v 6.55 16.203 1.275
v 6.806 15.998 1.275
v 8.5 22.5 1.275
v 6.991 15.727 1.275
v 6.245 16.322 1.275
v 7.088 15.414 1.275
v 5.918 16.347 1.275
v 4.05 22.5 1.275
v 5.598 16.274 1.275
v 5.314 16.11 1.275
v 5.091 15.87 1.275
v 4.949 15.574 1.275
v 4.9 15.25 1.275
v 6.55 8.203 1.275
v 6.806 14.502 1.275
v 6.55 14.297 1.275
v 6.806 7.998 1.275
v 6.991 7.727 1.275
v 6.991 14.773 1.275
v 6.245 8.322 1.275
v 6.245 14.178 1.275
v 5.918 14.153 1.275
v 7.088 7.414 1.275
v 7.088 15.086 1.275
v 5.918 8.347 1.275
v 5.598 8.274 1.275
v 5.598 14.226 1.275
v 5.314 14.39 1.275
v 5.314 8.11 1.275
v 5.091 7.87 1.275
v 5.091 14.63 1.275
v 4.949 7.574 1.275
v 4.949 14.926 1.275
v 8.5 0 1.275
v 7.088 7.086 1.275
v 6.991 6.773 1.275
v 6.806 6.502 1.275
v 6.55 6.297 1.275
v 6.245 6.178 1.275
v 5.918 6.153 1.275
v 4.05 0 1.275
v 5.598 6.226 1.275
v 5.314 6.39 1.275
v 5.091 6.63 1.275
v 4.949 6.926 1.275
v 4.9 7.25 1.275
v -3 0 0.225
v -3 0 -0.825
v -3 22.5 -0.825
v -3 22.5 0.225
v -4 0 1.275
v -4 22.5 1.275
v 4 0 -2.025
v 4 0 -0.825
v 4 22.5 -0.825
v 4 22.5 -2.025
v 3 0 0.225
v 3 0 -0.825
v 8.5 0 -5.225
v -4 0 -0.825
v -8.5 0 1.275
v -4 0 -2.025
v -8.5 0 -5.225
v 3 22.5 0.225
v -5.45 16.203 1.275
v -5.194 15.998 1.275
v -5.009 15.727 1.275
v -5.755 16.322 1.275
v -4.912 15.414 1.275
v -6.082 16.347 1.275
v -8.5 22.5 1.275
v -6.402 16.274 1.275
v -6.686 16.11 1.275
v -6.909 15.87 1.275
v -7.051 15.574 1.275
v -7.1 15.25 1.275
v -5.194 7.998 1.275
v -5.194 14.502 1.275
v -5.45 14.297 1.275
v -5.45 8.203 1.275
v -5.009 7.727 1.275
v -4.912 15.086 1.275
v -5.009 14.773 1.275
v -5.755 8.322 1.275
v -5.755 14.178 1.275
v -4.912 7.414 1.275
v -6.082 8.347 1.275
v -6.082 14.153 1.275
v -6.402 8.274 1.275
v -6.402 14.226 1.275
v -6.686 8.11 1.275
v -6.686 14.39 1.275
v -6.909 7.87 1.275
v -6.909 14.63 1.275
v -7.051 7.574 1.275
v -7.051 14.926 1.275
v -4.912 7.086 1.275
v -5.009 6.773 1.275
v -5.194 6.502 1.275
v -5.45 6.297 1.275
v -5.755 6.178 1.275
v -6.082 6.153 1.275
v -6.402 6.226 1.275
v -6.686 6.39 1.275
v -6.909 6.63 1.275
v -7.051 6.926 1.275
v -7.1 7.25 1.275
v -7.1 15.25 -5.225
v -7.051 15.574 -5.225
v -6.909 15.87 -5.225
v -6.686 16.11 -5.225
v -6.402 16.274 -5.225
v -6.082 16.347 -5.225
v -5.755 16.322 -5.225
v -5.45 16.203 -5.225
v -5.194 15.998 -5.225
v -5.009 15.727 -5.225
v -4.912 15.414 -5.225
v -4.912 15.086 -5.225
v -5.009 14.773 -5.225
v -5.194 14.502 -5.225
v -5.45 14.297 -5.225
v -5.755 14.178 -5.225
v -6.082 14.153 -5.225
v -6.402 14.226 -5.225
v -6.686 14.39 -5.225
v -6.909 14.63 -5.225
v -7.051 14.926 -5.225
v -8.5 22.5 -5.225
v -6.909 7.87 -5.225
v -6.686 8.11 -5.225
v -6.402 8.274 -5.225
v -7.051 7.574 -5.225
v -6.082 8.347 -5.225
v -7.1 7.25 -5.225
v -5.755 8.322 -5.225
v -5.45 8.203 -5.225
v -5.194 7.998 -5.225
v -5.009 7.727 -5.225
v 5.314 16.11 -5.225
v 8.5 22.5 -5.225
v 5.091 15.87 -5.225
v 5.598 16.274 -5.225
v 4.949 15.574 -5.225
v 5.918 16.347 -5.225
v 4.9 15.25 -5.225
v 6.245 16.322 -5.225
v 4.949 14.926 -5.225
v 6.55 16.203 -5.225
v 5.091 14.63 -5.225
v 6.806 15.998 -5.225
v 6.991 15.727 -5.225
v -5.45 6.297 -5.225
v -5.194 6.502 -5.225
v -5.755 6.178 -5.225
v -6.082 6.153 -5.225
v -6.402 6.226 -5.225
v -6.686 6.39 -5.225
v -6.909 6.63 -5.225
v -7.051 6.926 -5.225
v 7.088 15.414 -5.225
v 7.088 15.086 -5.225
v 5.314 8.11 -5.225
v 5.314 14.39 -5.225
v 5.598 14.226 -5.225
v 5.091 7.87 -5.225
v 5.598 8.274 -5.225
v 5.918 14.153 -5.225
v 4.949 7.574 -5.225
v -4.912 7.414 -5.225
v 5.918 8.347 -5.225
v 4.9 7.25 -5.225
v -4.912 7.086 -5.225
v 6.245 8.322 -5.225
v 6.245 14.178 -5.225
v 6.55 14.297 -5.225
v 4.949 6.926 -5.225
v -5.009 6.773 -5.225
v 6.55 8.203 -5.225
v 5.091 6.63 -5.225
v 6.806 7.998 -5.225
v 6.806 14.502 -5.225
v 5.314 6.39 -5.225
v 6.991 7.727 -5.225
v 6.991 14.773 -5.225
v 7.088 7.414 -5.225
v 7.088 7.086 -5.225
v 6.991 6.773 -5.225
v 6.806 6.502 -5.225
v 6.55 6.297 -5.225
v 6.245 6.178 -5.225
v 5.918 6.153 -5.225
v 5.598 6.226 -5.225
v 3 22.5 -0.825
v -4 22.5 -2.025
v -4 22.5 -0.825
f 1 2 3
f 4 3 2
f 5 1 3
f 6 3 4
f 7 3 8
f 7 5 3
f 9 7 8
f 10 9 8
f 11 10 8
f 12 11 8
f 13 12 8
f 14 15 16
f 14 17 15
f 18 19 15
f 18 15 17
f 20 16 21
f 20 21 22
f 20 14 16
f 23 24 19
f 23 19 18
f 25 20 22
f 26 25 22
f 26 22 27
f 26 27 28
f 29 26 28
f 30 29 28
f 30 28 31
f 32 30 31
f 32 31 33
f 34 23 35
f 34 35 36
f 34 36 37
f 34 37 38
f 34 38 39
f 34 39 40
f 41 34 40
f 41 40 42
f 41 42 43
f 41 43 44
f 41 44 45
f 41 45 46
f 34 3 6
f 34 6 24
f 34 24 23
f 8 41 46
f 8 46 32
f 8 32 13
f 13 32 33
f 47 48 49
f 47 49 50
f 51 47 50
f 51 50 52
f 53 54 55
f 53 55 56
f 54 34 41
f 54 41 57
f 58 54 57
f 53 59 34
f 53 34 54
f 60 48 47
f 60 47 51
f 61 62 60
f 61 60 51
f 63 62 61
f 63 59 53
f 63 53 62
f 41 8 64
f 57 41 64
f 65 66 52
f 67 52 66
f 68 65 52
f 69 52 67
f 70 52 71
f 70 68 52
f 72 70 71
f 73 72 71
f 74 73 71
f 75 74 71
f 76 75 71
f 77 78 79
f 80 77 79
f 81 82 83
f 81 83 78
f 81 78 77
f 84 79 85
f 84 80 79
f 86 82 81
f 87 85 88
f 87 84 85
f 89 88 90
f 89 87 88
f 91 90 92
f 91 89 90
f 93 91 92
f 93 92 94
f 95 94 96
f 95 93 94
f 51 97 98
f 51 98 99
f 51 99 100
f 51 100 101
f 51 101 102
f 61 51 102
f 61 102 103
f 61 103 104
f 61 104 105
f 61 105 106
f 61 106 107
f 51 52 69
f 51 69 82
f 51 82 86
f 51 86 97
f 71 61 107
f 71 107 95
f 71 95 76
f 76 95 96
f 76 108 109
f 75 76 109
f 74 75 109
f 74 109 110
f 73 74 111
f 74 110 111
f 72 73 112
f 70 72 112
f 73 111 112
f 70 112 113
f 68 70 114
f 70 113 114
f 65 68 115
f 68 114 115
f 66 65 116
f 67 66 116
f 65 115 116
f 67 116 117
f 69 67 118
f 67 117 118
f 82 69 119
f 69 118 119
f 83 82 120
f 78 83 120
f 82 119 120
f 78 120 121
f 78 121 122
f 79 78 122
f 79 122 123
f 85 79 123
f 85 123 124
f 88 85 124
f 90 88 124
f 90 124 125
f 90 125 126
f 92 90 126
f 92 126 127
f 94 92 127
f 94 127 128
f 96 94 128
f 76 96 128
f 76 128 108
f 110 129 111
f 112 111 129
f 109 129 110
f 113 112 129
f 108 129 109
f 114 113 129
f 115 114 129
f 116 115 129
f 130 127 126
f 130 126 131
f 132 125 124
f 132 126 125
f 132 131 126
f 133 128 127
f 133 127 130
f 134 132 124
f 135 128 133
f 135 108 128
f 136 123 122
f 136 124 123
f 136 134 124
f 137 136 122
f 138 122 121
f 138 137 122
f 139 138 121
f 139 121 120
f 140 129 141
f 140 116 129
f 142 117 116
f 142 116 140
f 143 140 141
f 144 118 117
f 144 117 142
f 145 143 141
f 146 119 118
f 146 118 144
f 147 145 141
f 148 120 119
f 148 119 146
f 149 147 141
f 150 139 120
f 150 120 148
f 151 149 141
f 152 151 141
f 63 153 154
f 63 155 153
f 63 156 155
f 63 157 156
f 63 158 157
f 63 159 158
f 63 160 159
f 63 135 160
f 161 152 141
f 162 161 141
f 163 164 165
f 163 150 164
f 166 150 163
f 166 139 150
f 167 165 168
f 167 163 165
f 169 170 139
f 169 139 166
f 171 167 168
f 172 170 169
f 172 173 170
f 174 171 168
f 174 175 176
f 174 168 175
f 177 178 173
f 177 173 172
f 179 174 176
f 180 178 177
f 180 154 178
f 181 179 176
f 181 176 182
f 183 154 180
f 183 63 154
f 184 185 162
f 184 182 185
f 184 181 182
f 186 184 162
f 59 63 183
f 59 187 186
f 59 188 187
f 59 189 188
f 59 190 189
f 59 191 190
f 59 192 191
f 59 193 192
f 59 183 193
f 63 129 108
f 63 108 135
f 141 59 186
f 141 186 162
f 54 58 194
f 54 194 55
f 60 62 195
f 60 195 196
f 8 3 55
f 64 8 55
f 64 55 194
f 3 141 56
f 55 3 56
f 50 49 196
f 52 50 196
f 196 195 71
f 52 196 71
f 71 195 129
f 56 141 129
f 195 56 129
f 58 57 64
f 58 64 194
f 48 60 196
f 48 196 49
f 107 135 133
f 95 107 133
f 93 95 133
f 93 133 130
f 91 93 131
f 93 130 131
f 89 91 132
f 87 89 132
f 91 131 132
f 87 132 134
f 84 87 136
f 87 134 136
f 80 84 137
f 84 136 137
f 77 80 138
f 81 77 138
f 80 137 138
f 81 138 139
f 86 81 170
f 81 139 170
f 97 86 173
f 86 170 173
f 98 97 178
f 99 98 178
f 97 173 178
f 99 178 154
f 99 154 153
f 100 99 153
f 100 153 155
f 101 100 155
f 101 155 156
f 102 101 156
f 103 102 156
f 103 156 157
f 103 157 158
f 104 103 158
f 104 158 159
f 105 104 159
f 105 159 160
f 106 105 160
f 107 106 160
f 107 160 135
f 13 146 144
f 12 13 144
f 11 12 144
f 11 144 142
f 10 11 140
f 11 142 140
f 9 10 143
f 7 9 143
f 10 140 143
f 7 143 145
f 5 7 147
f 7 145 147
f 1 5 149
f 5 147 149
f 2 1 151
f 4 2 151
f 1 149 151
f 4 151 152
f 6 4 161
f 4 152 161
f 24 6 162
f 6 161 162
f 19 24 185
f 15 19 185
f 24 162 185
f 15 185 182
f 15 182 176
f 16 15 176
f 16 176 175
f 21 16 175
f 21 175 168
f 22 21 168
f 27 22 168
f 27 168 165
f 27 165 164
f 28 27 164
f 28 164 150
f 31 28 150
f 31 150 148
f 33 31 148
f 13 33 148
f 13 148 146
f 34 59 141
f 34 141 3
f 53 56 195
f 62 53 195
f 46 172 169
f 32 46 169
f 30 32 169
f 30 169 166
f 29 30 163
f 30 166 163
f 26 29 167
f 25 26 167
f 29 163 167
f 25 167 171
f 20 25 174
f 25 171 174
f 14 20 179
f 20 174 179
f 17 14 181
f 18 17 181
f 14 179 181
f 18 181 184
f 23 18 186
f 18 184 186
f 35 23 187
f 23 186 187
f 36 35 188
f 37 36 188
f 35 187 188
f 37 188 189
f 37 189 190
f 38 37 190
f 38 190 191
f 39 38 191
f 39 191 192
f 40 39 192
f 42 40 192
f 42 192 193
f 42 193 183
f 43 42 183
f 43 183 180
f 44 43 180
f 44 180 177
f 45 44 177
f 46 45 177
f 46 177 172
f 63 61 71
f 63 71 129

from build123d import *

# Parameters (mm, degrees)
EXTRUDE_1_DEPTH     = 22.5
SKETCH_2_R          = 1.1
CUT_EXTRUDE_1_DEPTH = 10


with BuildPart() as part:
    # 草图1 → 凸台-拉伸1 (new body)
    with BuildSketch(Plane(origin=(0, 0, 0), x_dir=(1, 0, 0), z_dir=(0, 1, 0))):
        Polygon((-4, 0.824883125), (-3, 0.824883125), (-3, -0.225116875), (-4, -1.275116875), (-8.5, -1.275116875), (-8.5, 5.224883125), (8.5, 5.224883125), (8.5, -1.275116875), (4.05, -1.275116875), (3, -0.225116875), (3, 0.824883125), (4, 0.824883125), (4, 2.024883125), (-4, 2.024883125), align=None)
    extrude(amount=EXTRUDE_1_DEPTH)

    # 草图2 → 切除-拉伸1 (cut)
    with BuildSketch(Plane(origin=(0, 0, -5.224883125), x_dir=(-1, 0, 0), z_dir=(0, 0, -1))):
        with Locations((-6, 15.25)):
            Circle(SKETCH_2_R)
        with Locations((6, 15.25)):
            Circle(SKETCH_2_R)
        with Locations((6, 7.25)):
            Circle(SKETCH_2_R)
        with Locations((-6, 7.25)):
            Circle(SKETCH_2_R)
    extrude(amount=-CUT_EXTRUDE_1_DEPTH, mode=Mode.SUBTRACT)


solid = part.part
